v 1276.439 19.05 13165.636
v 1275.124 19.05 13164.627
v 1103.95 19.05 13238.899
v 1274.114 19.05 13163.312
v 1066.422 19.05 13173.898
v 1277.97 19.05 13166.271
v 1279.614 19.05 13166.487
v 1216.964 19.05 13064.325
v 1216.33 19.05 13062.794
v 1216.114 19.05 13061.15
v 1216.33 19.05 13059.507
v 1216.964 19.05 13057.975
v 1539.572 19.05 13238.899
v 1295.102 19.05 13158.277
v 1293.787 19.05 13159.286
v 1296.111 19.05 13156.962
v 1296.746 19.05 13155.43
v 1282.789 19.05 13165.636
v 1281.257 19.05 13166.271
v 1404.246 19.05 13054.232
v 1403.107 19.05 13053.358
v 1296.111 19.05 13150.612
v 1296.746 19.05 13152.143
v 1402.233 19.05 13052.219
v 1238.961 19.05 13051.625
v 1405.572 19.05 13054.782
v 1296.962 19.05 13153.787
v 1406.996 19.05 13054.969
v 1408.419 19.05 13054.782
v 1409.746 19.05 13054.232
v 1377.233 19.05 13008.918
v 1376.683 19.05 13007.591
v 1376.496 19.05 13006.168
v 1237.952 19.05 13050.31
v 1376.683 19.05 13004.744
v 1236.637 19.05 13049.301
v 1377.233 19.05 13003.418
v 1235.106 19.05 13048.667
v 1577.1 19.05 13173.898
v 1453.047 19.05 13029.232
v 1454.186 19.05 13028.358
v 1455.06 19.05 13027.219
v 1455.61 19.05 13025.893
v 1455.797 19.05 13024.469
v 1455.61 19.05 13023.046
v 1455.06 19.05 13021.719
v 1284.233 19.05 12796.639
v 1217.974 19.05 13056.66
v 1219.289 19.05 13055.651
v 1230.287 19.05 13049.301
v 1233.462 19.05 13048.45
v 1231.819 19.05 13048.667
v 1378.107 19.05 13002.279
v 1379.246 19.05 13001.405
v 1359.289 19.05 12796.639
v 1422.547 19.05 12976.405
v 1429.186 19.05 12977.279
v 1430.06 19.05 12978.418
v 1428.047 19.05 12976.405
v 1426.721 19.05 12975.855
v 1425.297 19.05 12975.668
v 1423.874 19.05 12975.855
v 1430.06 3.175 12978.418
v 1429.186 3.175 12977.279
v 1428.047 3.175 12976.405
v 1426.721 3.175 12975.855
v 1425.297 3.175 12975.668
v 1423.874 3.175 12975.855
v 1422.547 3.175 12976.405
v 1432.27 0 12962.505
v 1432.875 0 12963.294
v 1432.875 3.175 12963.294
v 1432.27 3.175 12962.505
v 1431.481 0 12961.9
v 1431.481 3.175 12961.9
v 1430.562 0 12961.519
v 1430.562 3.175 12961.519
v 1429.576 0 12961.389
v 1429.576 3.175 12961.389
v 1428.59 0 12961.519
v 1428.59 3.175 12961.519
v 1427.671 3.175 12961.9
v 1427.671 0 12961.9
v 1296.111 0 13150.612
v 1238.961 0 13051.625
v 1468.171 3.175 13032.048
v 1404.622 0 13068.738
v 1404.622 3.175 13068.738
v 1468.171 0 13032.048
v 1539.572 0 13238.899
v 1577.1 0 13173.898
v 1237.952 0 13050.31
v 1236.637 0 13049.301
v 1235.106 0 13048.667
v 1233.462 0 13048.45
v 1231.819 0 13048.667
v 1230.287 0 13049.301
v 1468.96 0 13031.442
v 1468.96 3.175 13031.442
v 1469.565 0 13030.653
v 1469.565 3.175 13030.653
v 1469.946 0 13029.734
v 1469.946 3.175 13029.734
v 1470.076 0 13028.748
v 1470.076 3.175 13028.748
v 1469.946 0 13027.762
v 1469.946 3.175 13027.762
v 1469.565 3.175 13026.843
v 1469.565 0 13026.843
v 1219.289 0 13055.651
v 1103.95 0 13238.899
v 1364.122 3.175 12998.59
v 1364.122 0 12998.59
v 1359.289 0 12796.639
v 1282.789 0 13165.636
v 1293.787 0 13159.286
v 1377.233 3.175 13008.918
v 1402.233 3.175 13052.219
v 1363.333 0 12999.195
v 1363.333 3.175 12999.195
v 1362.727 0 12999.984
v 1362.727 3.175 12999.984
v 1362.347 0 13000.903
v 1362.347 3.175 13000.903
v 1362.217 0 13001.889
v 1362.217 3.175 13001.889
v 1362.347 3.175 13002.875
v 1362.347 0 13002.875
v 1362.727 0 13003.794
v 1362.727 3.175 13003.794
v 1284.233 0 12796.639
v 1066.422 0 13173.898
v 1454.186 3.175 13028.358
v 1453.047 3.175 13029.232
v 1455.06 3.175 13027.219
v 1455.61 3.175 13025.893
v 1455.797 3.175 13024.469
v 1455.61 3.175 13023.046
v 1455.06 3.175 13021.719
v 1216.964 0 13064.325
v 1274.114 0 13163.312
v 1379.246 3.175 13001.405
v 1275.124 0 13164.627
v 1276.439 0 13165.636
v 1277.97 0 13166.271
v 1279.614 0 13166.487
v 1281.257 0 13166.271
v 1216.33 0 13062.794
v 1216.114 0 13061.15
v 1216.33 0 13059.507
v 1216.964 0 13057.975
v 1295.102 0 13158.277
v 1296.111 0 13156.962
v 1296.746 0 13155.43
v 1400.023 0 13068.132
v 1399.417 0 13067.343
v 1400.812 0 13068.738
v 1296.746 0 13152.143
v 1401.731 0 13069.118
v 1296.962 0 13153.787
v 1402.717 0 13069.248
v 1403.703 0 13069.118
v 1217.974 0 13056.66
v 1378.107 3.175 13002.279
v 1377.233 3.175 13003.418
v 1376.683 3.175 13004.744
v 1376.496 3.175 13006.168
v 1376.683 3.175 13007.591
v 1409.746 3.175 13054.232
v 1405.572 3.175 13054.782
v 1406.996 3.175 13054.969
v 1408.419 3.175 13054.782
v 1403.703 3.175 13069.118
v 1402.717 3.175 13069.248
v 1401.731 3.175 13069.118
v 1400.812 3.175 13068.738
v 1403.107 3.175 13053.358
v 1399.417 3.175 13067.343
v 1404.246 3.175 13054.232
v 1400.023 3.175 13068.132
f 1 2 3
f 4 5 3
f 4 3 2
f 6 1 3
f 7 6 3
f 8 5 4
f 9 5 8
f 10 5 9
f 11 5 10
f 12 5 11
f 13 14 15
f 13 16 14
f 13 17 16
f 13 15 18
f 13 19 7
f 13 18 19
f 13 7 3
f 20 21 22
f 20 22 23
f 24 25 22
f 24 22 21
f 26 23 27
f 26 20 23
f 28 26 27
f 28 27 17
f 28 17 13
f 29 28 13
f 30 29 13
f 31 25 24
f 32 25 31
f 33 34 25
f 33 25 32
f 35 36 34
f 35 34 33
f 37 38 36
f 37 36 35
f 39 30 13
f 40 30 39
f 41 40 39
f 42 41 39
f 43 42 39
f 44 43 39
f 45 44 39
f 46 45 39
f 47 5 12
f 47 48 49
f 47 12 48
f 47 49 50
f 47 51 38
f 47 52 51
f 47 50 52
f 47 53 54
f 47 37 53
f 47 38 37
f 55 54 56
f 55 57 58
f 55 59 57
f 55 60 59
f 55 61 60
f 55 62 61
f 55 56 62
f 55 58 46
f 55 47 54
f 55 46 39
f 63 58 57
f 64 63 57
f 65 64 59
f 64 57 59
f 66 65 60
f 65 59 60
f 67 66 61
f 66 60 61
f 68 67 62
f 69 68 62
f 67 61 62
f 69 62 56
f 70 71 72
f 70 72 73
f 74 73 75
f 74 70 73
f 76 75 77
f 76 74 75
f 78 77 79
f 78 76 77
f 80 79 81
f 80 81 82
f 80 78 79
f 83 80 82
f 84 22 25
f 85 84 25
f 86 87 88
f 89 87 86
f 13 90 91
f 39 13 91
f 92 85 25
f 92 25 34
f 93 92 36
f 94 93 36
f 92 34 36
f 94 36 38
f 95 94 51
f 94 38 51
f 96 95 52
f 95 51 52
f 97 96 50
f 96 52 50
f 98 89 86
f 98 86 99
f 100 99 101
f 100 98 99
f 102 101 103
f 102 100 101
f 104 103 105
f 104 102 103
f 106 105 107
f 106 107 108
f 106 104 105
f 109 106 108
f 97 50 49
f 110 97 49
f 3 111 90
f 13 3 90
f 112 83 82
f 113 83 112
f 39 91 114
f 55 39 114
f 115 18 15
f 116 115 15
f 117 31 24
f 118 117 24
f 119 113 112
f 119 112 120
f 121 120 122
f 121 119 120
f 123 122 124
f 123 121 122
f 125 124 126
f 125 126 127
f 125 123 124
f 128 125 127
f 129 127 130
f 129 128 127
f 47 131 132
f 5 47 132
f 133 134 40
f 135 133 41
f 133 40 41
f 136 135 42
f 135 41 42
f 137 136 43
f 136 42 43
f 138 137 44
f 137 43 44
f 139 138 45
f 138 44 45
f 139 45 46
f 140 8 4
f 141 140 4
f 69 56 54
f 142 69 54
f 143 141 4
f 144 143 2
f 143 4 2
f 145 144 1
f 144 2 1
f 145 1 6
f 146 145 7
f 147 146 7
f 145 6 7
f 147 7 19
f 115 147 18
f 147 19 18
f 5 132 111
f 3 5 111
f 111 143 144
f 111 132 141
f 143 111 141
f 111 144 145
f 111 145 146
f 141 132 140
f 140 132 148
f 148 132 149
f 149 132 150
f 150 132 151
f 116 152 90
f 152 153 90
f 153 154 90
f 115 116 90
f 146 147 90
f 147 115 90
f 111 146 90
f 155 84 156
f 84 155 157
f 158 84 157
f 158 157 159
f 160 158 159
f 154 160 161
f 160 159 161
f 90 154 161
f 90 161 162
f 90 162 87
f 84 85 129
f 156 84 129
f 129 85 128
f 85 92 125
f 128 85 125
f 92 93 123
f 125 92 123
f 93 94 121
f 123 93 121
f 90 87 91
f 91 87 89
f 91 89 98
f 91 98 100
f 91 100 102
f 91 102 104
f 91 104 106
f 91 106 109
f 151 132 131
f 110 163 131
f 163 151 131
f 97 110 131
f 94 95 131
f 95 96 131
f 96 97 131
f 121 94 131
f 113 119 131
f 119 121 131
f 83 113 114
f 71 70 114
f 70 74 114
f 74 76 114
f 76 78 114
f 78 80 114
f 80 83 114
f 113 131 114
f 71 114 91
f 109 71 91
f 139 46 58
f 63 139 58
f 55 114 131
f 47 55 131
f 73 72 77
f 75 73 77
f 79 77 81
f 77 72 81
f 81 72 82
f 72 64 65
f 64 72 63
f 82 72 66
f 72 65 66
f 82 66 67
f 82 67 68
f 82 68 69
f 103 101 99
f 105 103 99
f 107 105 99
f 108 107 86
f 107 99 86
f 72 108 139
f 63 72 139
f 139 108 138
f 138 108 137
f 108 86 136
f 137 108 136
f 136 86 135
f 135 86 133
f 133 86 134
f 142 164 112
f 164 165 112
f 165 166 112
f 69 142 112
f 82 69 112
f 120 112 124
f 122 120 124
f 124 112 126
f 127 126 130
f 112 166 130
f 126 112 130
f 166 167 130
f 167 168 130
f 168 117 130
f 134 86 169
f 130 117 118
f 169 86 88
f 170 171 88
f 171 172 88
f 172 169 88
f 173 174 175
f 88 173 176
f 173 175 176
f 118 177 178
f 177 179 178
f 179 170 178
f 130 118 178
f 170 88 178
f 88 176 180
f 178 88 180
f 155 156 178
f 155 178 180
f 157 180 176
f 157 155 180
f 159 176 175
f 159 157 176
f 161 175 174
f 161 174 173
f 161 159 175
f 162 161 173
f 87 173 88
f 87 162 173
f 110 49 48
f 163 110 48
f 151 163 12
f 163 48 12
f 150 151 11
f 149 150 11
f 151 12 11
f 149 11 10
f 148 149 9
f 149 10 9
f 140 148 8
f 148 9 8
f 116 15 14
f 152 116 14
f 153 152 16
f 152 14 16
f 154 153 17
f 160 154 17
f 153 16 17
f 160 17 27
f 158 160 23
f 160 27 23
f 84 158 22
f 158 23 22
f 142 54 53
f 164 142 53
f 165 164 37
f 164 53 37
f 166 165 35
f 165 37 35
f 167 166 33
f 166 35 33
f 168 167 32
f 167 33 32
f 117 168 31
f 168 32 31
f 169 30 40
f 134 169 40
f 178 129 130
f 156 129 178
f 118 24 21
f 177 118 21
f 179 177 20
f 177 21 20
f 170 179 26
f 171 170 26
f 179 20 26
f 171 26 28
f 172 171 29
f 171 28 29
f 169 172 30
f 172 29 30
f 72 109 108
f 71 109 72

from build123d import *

# Parameters (mm, degrees)
BOSS_EXTRUDE1_DEPTH = 19.05
CUT_EXTRUDE1_DEPTH  = 20
CUT_EXTRUDE2_DEPTH  = 3.175
CUT_EXTRUDE3_DEPTH  = 19.05


with BuildPart() as part:
    # Sketch1 → Boss-Extrude1 (new body)
    with BuildSketch(Plane(origin=(-388.281715987, 0, -288.185661777), x_dir=(1, 0, 0), z_dir=(0, 1, 0))):
        Polygon((1747.570833697, -13084.824581071), (1672.514355591, -13084.824581071), (1454.703489965, -13462.084066777), (1492.231729019, -13527.084883536), (1927.853460271, -13527.084883536), (1965.381699324, -13462.084066777), align=None)
    extrude(amount=BOSS_EXTRUDE1_DEPTH)

    # Sketch4 → Cut-Extrude1 (cut)
    with BuildSketch(Plane(origin=(0, 19.05, 0), x_dir=(1, 0, 0), z_dir=(0, 1, 0))):
        with BuildLine():
            Line((1377.232664741, -13008.917958926), (1402.232664763, -13052.21922919))
            ThreePointArc((1402.232664763, -13052.21922919), (1405.572299736, -13054.781821235), (1409.745804474, -13054.232368895))
            Line((1409.745804474, -13054.232368895), (1453.047074654, -13029.232368878))
            ThreePointArc((1453.047074654, -13029.232368878), (1455.609666681, -13025.892733929), (1455.060214377, -13021.7192292))
            Line((1455.060214377, -13021.7192292), (1430.060214339, -12978.417958945))
            ThreePointArc((1430.060214339, -12978.417958945), (1426.720579378, -12975.855366909), (1422.547074644, -12976.404819231))
            Line((1422.547074644, -12976.404819231), (1379.245804465, -13001.404819247))
            ThreePointArc((1379.245804465, -13001.404819247), (1376.683212438, -13004.744454197), (1377.232664741, -13008.917958926))
        make_face()
    extrude(amount=-CUT_EXTRUDE1_DEPTH, mode=Mode.SUBTRACT)

    # Sketch5 → Cut-Extrude2 (cut)
    with BuildSketch(Plane.XZ):
        with BuildLine():
            Line((1427.670911631, 12961.899565184), (1364.121967469, 12998.589565203))
            ThreePointArc((1364.121967469, 12998.589565203), (1362.34679007, 13000.903021429), (1362.72741068, 13003.794121991))
            Line((1362.72741068, 13003.794121991), (1399.417410699, 13067.343066154))
            ThreePointArc((1399.417410699, 13067.343066154), (1401.730866926, 13069.118243552), (1404.621967488, 13068.737622942))
            Line((1404.621967488, 13068.737622942), (1468.17091165, 13032.047622923))
            ThreePointArc((1468.17091165, 13032.047622923), (1469.946089048, 13029.734166696), (1469.565468439, 13026.843066135))
            Line((1469.565468439, 13026.843066135), (1432.87546842, 12963.294121972))
            ThreePointArc((1432.87546842, 12963.294121972), (1430.562012193, 12961.518944574), (1427.670911631, 12961.899565184))
        make_face()
    extrude(amount=-CUT_EXTRUDE2_DEPTH, mode=Mode.SUBTRACT)

    # Sketch6 → Cut-Extrude3 (cut)
    with BuildSketch(Plane(origin=(0, 19.05, 0), x_dir=(1, 0, 0), z_dir=(0, 1, 0))):
        with BuildLine():
            Line((1216.964435014, -13064.325242236), (1274.114435014, -13163.311945889))
            ThreePointArc((1274.114435014, -13163.311945889), (1277.970195391, -13166.270574886), (1282.788696328, -13165.636207203))
            Line((1282.788696328, -13165.636207203), (1293.787218956, -13159.286207203))
            ThreePointArc((1293.787218956, -13159.286207203), (1296.745847953, -13155.430446825), (1296.11148027, -13150.611945889))
            Line((1296.11148027, -13150.611945889), (1238.96148027, -13051.625242236))
            ThreePointArc((1238.96148027, -13051.625242236), (1235.105719892, -13048.66661324), (1230.287218956, -13049.300980922))
            Line((1230.287218956, -13049.300980922), (1219.288696328, -13055.650980922))
            ThreePointArc((1219.288696328, -13055.650980922), (1216.330067331, -13059.5067413), (1216.964435014, -13064.325242236))
        make_face()
    extrude(amount=-CUT_EXTRUDE3_DEPTH, mode=Mode.SUBTRACT)


solid = part.part
